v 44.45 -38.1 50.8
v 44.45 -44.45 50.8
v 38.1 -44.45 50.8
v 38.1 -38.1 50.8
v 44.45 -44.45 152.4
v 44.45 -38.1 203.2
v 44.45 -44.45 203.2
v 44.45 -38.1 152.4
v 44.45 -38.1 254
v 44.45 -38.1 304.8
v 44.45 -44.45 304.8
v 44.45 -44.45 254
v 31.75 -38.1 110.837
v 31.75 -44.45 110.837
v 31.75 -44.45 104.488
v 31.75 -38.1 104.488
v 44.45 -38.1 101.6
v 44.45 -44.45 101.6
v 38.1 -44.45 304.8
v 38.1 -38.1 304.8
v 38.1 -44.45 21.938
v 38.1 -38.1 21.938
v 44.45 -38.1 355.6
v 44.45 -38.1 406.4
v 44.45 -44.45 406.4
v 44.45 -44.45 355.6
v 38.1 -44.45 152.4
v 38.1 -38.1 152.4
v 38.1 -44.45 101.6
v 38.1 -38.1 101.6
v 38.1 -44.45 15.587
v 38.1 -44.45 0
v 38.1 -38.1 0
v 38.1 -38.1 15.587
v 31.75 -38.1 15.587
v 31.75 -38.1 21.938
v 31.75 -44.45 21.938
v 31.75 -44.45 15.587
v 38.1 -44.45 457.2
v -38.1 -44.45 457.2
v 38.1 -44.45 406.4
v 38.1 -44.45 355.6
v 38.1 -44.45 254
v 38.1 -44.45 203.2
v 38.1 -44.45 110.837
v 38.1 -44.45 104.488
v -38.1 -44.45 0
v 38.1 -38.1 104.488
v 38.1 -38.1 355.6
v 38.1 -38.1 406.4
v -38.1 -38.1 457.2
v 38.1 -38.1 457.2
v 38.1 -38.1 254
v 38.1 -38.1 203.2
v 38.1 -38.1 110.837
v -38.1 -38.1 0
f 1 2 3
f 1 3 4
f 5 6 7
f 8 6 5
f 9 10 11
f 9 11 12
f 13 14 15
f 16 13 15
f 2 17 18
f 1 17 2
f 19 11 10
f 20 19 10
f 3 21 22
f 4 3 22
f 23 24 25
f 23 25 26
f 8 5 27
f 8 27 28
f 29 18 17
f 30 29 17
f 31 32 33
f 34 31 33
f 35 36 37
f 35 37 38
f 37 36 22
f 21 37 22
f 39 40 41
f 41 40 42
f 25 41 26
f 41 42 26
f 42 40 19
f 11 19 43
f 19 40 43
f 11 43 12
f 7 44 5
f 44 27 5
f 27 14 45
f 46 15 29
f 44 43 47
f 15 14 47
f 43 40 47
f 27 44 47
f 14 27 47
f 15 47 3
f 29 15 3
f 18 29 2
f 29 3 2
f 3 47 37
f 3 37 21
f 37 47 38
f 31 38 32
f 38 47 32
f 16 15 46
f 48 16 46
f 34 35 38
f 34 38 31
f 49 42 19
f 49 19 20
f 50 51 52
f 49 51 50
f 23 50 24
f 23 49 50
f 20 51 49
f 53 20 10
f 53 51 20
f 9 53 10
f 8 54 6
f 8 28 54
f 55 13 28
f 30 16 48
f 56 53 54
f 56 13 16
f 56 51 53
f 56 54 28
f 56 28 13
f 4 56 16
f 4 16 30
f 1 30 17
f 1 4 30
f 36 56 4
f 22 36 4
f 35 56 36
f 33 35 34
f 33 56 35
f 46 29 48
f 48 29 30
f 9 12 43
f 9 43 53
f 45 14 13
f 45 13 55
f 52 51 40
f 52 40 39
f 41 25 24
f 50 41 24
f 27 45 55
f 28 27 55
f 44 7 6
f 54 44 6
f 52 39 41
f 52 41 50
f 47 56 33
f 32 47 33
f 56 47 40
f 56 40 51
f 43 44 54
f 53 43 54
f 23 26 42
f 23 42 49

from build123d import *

# Parameters (mm, degrees)
SKETCH1_W           = 76.2
SKETCH1_H           = 6.35
BOSS_EXTRUDE1_DEPTH = 457.2
SKETCH2_W           = 50.8
SKETCH2_H           = 6.35
BOSS_EXTRUDE2_DEPTH = 6.35
SKETCH3_W           = 6.35
SKETCH3_H           = 6.35
CUT_EXTRUDE1_DEPTH  = 6.35
SKETCH4_W           = 6.35
SKETCH4_H           = 6.35
CUT_EXTRUDE2_DEPTH  = 460.399570091


with BuildPart() as part:
    # Sketch1 → Boss-Extrude1 (new body)
    with BuildSketch(Plane.XY):
        with Locations((0, -41.275)):
            Rectangle(SKETCH1_W, SKETCH1_H)
    extrude(amount=BOSS_EXTRUDE1_DEPTH)

    # Sketch2 → Boss-Extrude2 (add)
    with BuildSketch(Plane(origin=(38.1, 0, 0), x_dir=(0, 0, -1), z_dir=(1, 0, 0))):
        with Locations((-381, -41.275)):
            Rectangle(SKETCH2_W, SKETCH2_H)
        with Locations((-279.4, -41.275)):
            Rectangle(SKETCH2_W, SKETCH2_H)
        with Locations((-177.8, -41.275)):
            Rectangle(SKETCH2_W, SKETCH2_H)
        with Locations((-76.2, -41.275)):
            Rectangle(SKETCH2_W, SKETCH2_H)
    extrude(amount=BOSS_EXTRUDE2_DEPTH)

    # Sketch3 → Cut-Extrude1 (cut)
    with BuildSketch(Plane(origin=(0, -38.1, 0), x_dir=(1, 0, 0), z_dir=(0, 1, 0))):
        with Locations((34.925, -107.6625)):
            Rectangle(SKETCH3_W, SKETCH3_H)
    extrude(amount=-CUT_EXTRUDE1_DEPTH, mode=Mode.SUBTRACT)

    # Sketch4 → Cut-Extrude2 (cut, through all)
    with BuildSketch(Plane(origin=(0, -38.1, 0), x_dir=(1, 0, 0), z_dir=(0, 1, 0))):
        with Locations((34.925, -18.7625)):
            Rectangle(SKETCH4_W, SKETCH4_H)
    extrude(amount=-CUT_EXTRUDE2_DEPTH, mode=Mode.SUBTRACT)


solid = part.part
